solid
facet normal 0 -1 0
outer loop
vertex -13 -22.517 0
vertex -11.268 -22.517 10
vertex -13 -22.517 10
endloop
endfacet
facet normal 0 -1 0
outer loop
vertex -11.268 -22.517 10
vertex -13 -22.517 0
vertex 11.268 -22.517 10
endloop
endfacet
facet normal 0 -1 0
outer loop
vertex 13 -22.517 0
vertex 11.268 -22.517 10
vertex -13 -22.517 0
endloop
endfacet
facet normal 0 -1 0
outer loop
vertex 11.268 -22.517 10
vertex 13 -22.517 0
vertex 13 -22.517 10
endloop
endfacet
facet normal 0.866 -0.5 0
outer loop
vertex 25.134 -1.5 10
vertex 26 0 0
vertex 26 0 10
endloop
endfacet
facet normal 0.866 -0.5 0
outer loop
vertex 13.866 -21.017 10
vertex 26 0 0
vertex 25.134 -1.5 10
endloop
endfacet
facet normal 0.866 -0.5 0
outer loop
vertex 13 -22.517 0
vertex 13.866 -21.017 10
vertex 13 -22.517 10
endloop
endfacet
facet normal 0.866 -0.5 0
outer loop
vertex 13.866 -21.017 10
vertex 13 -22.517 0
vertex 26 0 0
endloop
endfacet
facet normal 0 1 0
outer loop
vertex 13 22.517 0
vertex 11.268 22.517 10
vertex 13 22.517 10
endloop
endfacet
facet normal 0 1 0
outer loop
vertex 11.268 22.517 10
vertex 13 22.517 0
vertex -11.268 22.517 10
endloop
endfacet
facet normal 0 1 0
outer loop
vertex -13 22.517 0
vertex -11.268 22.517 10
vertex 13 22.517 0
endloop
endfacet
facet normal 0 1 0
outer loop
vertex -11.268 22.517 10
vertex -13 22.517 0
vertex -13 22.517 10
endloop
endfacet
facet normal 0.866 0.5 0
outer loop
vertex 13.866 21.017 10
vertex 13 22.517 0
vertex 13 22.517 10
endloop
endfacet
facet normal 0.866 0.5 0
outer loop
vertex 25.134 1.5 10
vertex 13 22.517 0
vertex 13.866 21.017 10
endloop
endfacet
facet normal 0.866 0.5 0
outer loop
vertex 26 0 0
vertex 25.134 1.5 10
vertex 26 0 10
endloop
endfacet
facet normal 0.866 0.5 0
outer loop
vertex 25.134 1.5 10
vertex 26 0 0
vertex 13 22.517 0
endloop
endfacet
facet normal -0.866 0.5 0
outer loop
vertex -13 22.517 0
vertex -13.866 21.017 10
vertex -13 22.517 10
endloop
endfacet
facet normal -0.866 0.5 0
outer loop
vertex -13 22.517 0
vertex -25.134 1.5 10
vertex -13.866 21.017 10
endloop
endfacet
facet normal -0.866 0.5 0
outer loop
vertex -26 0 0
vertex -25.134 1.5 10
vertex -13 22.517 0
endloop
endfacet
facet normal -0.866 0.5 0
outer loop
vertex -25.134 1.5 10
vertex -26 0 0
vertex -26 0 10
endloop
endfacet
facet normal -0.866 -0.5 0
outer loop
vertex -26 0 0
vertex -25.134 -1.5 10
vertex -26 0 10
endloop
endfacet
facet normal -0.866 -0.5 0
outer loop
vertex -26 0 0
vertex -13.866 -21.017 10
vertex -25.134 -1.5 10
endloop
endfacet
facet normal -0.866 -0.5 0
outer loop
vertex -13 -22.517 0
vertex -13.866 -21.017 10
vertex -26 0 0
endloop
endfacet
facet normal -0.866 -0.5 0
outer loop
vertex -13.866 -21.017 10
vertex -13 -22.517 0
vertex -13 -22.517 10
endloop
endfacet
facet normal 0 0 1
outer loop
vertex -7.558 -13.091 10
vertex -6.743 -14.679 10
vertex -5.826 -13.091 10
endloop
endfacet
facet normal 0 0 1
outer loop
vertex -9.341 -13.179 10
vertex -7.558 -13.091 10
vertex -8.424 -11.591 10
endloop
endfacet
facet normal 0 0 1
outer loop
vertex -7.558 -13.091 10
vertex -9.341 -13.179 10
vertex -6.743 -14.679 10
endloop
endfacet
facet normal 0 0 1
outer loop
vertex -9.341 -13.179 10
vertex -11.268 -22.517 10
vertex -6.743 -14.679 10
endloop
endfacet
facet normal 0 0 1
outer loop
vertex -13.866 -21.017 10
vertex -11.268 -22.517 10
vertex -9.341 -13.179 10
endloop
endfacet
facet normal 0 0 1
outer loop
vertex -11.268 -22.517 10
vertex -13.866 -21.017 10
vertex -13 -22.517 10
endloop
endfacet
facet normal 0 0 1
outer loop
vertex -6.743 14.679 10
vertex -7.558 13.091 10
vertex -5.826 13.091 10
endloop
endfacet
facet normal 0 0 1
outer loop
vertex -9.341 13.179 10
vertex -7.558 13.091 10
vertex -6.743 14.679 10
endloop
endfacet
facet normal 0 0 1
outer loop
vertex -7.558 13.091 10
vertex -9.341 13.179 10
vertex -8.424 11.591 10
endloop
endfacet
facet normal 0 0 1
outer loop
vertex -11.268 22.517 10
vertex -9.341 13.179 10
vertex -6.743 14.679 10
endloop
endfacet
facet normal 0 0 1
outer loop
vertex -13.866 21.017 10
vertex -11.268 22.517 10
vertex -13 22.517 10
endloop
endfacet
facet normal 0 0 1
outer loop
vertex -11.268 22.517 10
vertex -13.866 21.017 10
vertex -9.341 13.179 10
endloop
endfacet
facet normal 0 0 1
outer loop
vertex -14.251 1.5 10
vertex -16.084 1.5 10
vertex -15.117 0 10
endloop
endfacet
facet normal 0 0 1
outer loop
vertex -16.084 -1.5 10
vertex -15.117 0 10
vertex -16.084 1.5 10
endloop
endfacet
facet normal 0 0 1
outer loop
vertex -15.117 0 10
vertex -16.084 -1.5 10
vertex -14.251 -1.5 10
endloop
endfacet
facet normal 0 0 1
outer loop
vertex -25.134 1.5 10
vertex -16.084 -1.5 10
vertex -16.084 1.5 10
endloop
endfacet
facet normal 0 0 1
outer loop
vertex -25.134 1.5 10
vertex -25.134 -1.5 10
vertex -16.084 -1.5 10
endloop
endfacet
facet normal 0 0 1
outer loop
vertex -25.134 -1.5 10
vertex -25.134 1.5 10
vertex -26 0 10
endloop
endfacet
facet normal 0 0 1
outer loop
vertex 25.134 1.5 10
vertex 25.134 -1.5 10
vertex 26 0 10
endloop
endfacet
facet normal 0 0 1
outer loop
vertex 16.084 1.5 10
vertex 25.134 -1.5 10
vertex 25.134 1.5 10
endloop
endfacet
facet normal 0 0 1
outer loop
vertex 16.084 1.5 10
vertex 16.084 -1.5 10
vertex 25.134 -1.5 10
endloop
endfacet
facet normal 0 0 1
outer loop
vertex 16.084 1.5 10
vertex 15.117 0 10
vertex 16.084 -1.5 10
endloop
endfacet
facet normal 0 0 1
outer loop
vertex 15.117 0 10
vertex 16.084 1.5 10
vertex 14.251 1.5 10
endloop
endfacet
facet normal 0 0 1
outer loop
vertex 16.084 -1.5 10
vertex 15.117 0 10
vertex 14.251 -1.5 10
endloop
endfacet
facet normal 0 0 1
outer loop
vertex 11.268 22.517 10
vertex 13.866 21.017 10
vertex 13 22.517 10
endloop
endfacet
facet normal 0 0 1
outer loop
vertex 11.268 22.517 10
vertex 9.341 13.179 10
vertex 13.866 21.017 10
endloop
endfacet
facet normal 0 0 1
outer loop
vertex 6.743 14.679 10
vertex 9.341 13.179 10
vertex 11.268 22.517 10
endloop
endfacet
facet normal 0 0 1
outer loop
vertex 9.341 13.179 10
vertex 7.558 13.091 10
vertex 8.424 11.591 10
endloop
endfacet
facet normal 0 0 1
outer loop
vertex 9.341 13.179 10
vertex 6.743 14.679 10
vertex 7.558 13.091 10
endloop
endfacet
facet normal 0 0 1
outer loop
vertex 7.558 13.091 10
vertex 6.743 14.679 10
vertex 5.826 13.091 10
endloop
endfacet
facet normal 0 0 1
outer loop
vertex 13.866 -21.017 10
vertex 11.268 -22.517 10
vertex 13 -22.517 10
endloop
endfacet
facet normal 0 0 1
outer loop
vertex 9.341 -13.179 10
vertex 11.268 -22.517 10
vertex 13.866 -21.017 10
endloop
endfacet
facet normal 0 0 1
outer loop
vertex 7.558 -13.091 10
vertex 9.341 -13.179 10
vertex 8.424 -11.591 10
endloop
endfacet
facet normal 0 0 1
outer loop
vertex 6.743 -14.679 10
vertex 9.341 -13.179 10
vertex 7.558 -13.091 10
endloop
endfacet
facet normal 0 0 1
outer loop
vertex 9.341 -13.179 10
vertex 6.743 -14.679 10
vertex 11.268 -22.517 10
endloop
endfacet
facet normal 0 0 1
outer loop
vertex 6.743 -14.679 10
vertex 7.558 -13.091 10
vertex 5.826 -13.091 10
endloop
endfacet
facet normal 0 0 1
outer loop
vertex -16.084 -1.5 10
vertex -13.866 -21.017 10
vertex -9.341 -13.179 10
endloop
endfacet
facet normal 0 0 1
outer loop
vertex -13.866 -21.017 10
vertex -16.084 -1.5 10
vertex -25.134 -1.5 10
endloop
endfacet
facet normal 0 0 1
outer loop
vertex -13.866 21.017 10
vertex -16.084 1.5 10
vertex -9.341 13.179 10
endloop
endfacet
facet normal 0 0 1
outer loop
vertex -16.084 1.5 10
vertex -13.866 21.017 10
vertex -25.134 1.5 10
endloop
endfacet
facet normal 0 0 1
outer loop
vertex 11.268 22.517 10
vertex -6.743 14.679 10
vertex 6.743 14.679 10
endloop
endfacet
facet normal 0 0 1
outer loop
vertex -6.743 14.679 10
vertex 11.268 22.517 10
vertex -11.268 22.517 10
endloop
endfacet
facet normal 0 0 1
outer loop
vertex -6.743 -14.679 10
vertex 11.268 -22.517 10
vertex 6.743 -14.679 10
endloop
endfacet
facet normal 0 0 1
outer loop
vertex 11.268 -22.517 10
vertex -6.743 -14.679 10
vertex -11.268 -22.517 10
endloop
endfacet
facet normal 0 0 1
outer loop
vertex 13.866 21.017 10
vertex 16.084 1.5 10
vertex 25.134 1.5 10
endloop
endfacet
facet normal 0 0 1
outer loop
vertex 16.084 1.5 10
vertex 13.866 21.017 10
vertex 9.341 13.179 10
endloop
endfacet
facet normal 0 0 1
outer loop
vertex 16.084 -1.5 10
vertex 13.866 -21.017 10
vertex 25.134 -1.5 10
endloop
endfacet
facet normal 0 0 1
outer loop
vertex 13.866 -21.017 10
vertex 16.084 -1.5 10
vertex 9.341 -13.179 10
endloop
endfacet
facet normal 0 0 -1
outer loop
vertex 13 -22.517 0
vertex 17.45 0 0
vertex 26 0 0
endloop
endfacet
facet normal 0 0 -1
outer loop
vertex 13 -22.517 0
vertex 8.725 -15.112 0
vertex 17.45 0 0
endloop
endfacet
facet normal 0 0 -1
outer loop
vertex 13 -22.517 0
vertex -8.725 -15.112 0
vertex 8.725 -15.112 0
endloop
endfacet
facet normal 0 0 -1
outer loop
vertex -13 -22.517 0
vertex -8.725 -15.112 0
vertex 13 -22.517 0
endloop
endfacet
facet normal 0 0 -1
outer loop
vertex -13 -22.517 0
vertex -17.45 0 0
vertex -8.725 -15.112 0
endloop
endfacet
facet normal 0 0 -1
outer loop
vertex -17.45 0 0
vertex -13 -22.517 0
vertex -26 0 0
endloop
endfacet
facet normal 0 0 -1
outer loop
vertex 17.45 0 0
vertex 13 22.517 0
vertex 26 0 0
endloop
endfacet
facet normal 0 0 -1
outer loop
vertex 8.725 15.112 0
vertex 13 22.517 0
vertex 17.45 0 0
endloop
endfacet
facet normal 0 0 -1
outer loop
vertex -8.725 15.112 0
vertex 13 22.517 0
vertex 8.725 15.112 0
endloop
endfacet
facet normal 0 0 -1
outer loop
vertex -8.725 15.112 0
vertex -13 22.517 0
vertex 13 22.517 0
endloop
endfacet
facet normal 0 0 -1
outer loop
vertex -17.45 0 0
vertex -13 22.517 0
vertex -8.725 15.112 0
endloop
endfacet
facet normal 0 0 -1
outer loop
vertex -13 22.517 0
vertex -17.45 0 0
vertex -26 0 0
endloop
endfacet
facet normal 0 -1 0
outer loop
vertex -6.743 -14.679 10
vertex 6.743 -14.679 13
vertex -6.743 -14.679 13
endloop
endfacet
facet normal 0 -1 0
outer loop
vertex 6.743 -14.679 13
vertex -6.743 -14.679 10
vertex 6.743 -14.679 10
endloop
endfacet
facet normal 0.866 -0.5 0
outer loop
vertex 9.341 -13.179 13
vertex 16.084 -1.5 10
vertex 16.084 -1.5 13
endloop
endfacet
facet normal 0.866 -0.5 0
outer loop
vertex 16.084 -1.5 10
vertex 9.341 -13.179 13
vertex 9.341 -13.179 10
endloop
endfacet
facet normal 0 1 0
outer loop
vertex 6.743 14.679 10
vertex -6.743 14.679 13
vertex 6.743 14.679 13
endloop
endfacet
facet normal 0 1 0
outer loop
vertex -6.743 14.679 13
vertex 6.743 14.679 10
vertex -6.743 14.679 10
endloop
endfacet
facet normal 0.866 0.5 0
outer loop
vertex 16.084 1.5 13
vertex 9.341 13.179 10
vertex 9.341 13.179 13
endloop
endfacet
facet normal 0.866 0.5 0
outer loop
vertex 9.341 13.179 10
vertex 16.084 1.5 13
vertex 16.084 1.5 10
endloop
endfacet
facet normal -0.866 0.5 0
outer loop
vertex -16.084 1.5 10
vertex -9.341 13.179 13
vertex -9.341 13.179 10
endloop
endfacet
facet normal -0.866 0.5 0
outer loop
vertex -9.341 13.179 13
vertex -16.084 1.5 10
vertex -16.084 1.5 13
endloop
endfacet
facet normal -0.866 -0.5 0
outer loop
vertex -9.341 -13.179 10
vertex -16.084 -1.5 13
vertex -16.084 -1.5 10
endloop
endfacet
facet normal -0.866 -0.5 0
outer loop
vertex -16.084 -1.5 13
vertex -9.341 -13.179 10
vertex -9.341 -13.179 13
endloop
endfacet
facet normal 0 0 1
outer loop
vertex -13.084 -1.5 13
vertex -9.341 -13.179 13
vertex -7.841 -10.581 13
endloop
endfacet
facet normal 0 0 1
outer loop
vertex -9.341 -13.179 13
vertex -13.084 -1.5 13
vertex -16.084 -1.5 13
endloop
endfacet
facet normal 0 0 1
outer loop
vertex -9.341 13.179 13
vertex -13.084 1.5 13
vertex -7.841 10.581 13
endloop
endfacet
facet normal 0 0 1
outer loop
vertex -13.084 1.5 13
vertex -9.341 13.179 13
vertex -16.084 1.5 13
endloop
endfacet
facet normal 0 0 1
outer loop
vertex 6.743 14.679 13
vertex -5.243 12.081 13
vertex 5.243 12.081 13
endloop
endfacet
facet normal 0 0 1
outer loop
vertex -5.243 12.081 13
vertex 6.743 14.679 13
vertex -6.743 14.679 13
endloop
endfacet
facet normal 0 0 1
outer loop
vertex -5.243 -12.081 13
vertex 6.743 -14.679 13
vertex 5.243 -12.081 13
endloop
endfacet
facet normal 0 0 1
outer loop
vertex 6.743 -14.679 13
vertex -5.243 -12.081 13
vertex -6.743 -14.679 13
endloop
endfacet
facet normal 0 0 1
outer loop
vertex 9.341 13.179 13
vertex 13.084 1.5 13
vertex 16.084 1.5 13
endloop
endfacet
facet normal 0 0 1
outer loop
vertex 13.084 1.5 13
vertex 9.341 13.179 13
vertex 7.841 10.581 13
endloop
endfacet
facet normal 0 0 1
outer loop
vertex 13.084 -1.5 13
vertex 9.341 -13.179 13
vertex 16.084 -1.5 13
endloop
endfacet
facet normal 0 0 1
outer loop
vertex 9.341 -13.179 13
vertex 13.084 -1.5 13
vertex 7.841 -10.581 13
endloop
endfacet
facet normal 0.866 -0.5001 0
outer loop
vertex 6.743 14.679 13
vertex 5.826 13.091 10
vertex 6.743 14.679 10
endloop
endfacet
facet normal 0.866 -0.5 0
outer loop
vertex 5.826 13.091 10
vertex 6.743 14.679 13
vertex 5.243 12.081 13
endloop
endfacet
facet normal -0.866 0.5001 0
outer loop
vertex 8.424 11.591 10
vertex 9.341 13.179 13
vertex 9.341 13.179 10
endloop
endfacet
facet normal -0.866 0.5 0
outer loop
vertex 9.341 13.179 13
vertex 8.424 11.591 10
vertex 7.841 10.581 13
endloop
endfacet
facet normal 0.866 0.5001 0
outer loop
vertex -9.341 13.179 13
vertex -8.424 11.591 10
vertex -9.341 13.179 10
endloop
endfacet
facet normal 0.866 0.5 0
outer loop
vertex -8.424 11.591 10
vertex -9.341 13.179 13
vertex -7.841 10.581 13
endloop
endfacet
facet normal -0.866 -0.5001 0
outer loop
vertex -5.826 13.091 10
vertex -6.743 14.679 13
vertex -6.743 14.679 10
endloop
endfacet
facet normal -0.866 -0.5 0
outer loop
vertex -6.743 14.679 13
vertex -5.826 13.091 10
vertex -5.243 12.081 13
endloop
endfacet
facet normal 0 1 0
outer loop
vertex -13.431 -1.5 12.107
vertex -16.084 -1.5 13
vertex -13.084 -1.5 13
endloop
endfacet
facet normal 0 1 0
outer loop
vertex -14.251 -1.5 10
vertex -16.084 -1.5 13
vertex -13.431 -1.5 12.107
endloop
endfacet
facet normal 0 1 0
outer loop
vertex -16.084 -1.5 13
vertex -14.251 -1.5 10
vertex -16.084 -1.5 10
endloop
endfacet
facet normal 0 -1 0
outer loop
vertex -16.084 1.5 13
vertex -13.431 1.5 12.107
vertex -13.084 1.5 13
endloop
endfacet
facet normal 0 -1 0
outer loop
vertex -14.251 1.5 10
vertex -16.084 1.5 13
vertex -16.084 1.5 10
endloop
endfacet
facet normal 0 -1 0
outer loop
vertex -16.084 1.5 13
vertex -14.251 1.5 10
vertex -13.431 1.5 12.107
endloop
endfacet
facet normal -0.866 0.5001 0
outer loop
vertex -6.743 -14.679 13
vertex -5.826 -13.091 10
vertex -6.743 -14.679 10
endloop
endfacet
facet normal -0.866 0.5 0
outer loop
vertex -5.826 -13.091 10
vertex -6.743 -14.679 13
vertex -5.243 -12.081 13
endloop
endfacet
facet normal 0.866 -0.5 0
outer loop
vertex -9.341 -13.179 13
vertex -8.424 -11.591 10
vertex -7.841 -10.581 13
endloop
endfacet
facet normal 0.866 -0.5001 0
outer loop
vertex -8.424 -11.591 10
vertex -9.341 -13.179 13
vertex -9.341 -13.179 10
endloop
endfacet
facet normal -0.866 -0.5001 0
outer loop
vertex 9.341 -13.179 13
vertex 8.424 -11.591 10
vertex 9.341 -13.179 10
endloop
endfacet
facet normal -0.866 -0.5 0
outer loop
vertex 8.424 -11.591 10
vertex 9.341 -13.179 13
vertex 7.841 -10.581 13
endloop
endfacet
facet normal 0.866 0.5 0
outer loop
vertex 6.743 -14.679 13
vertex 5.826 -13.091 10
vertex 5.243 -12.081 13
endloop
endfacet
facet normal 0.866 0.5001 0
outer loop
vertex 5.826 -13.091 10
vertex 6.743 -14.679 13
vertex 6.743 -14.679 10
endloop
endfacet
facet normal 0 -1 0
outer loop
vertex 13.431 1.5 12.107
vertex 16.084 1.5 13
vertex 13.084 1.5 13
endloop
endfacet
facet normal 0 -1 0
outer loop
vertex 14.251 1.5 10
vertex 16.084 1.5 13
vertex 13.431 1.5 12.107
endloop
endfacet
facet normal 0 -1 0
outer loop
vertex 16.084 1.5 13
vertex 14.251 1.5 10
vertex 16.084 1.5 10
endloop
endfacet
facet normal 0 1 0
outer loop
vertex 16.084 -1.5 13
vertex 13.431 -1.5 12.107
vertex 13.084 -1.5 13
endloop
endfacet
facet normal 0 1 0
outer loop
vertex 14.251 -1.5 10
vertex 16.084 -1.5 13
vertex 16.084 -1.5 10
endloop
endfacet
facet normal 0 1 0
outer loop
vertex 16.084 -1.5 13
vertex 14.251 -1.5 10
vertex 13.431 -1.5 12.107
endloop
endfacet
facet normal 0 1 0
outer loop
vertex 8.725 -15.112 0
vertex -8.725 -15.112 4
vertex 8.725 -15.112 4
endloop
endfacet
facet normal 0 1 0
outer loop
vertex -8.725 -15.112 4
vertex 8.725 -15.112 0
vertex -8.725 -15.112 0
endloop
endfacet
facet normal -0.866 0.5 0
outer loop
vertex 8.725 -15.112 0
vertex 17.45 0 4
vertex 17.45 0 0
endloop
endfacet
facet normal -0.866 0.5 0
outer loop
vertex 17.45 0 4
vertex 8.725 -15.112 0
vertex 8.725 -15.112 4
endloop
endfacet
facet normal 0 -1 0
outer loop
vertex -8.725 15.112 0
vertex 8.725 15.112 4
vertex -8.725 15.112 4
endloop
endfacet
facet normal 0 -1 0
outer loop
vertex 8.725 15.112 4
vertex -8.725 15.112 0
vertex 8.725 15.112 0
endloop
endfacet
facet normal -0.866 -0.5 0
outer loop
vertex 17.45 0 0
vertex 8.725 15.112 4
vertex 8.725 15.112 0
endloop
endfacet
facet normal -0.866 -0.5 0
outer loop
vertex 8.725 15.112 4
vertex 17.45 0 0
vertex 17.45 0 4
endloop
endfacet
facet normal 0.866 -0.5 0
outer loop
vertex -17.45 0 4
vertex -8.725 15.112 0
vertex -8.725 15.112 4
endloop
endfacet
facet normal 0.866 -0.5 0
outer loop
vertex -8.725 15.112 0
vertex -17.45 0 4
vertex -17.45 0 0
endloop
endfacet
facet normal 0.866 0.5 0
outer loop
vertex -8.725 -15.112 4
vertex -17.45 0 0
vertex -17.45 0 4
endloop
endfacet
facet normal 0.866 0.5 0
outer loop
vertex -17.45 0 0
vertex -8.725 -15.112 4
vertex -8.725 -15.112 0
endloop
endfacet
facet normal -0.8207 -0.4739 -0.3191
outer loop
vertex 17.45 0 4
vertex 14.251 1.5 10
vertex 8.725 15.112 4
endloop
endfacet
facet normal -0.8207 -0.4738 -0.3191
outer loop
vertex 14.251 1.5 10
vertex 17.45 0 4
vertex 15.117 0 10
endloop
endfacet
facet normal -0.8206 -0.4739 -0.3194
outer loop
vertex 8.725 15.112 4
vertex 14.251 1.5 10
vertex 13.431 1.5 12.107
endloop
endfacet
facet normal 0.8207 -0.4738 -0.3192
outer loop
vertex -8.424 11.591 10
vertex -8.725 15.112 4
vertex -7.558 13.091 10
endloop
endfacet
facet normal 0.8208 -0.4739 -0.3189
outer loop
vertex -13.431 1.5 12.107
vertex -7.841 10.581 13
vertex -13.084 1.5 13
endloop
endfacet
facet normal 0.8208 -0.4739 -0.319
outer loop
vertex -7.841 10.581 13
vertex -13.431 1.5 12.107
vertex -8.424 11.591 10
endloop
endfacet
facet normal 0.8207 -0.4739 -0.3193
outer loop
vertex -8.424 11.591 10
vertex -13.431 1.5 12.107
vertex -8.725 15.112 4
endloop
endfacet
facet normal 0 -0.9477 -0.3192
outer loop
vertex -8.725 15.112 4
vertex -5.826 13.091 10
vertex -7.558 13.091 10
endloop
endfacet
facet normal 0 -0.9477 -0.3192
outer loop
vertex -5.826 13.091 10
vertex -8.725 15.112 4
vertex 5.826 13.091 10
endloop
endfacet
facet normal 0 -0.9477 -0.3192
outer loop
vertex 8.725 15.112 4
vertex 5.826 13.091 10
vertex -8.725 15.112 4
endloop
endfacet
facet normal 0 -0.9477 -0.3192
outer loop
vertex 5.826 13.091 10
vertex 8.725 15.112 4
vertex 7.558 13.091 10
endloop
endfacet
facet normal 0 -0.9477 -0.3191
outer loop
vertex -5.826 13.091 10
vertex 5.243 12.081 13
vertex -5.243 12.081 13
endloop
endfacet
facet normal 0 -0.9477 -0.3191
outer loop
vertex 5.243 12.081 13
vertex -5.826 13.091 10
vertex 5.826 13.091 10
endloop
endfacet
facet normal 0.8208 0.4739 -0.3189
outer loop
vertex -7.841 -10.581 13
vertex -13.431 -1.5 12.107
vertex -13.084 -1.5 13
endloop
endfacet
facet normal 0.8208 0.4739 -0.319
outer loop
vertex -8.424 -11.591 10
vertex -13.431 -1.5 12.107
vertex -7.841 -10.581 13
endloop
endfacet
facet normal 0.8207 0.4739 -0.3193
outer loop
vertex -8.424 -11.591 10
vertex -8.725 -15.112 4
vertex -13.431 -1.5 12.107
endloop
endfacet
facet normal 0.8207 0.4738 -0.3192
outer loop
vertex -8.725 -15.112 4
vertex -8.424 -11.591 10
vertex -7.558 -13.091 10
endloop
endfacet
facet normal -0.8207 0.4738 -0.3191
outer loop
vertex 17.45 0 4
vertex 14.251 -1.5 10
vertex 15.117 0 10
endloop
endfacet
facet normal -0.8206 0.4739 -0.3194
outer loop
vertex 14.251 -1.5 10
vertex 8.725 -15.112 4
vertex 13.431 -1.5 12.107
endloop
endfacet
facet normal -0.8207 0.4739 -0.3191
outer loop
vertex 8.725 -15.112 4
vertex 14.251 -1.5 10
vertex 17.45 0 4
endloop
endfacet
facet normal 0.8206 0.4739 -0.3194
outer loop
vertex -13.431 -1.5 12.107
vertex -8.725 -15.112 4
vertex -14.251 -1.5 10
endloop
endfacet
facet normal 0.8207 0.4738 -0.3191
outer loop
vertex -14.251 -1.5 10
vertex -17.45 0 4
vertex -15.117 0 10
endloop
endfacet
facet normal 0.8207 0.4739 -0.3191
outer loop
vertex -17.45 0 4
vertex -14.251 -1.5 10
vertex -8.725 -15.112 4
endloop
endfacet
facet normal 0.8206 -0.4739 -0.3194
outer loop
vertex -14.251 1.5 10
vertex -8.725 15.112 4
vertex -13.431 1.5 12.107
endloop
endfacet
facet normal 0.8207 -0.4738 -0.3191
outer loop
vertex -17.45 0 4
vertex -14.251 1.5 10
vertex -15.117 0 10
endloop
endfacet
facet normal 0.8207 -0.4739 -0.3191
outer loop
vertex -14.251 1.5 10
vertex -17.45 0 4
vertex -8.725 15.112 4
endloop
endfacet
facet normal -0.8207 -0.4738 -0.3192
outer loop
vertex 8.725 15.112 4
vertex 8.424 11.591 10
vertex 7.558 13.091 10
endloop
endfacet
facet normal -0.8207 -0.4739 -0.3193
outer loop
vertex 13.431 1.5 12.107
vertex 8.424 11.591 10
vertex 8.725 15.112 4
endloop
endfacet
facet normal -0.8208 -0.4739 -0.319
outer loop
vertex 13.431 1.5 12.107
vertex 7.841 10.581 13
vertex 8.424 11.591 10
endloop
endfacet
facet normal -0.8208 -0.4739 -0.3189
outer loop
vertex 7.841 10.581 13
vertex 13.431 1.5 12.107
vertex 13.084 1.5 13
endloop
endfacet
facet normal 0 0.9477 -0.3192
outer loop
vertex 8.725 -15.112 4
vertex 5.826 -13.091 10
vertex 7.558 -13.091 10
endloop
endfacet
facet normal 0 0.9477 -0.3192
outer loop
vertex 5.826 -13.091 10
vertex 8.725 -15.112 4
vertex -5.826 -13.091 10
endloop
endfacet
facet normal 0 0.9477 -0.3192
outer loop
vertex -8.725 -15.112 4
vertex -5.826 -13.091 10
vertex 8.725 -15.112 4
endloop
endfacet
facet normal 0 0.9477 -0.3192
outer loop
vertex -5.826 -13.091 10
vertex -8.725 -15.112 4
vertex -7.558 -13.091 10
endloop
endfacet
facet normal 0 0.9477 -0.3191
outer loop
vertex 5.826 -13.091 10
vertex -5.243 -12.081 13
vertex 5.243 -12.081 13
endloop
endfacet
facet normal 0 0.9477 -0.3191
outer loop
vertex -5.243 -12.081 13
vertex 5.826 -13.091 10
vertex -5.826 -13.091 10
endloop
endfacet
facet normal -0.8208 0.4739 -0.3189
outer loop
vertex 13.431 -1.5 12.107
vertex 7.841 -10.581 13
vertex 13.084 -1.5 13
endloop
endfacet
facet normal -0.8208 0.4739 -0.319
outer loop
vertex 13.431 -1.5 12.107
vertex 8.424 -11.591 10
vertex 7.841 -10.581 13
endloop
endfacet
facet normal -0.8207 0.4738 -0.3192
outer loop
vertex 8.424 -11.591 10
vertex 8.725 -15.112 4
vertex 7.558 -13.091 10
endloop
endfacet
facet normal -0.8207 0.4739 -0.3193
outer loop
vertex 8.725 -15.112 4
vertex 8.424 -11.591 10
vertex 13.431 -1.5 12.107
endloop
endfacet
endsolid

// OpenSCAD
// HexaGon
// Gravi Trax  
// Build Element V4
// NIS


// aussenform

/* [HexaGon blue] */

// HexaGon high
hex_h  = 10; // [5:1.0:170]

// HexaGon Radius Bottom
hex_r1 = 26; // [20:1.0:40]
// print 53.5 - other 52 schmaeler gemacht

// HexaGon Radius Top
hex_r2 = 26; // [20:1.0:40]
// ----------------------------------------------

/* [Snap (yellow)] */

// Snap Top high (clip)
snap_cut = 3;  // [1:0.5:5]

// Snap Bottom high (hole) depth
snap_h = 4;  // [2:1.0:6]

// Snap Top radius (outside)
hex_in = 33.9; // [32:0.1:36]

// Snap Border thickness (yellow)
hex_cut_rand = 7;  // [5:0.5:10] 
// hoeher = breiter
// breite snapper

// Snap Bottom Hole (inside)
hex_cut = 34.9;  // [33:0.1:37]
// hoeher = mehr platz

// ######################################################################

/* [Hidden] */

hex_in_h  = snap_cut + hex_h;
hex_in_r1= hex_in/2; // kleiner, schnapp bereich
hex_in_r2= hex_in/2;

// loch cutt
hex_cut_r1= (hex_cut)/2; // main snap 34, unten
hex_cut_r2= (hex_cut-hex_cut_rand)/2;
hex_cut_h  = snap_h + hex_h;


module hexagon_go()
{
    difference()
    {
        union() 
        {
            color("blue") cylinder(hex_h,r1=hex_r1,r2=hex_r2,center=false, $fn=6);
            color("yellow") cylinder(hex_in_h,r1=hex_in_r1,r2=hex_in_r2,center=false, $fn=6);
        }
        
        cylinder(h=snap_h,r1=hex_cut_r1,r2=hex_cut_r1,center=false, $fn=6);        
        translate([0,0,snap_h]) 
            cylinder(h=hex_h-snap_h+snap_cut,r1=hex_cut_r1,r2=hex_cut_r2,center=false, $fn=6);      
      
        for (run =[1:6]) {
            rotate([0,0,run*60]) translate([0,-1.5,hex_h]) 
            cube([100,3,10], center=false);
        } 
    }
}


// hexagon();
hexagon_go();
